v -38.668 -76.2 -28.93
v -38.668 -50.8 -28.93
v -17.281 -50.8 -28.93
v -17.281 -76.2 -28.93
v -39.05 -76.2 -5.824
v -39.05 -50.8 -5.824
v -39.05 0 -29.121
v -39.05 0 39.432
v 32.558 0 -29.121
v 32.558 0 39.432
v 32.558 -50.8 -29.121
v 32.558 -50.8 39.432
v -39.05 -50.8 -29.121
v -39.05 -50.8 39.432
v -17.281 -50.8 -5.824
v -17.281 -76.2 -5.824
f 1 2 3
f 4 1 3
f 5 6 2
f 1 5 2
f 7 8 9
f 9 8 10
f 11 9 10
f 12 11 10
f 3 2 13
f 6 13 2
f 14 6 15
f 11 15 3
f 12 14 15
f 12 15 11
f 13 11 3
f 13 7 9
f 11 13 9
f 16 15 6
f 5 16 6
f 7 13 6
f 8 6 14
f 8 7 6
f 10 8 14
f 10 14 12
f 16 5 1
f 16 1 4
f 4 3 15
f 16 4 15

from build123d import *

# Parameters (mm, degrees)
F0_W     = 71.607996
F0_H     = 68.552719
F1_DEPTH = 50.8
F4_DEPTH = 25.4


with BuildPart() as f1:
    # F0 (on Front) → F1 (new body)
    with BuildSketch(Plane.XZ):
        with Locations((-3.246227, 5.155774)):
            Rectangle(F0_W, F0_H)
    extrude(amount=F1_DEPTH)

    # F3 (on face) → F4 (join)
    with BuildSketch(Plane.XZ.offset(50.8)):
        Polygon((-39.050225, -5.824117), (-38.668316, -28.92963), (-17.281396, -28.92963), (-17.281396, -5.824117), align=None)
    extrude(amount=F4_DEPTH)


solid = f1.part
